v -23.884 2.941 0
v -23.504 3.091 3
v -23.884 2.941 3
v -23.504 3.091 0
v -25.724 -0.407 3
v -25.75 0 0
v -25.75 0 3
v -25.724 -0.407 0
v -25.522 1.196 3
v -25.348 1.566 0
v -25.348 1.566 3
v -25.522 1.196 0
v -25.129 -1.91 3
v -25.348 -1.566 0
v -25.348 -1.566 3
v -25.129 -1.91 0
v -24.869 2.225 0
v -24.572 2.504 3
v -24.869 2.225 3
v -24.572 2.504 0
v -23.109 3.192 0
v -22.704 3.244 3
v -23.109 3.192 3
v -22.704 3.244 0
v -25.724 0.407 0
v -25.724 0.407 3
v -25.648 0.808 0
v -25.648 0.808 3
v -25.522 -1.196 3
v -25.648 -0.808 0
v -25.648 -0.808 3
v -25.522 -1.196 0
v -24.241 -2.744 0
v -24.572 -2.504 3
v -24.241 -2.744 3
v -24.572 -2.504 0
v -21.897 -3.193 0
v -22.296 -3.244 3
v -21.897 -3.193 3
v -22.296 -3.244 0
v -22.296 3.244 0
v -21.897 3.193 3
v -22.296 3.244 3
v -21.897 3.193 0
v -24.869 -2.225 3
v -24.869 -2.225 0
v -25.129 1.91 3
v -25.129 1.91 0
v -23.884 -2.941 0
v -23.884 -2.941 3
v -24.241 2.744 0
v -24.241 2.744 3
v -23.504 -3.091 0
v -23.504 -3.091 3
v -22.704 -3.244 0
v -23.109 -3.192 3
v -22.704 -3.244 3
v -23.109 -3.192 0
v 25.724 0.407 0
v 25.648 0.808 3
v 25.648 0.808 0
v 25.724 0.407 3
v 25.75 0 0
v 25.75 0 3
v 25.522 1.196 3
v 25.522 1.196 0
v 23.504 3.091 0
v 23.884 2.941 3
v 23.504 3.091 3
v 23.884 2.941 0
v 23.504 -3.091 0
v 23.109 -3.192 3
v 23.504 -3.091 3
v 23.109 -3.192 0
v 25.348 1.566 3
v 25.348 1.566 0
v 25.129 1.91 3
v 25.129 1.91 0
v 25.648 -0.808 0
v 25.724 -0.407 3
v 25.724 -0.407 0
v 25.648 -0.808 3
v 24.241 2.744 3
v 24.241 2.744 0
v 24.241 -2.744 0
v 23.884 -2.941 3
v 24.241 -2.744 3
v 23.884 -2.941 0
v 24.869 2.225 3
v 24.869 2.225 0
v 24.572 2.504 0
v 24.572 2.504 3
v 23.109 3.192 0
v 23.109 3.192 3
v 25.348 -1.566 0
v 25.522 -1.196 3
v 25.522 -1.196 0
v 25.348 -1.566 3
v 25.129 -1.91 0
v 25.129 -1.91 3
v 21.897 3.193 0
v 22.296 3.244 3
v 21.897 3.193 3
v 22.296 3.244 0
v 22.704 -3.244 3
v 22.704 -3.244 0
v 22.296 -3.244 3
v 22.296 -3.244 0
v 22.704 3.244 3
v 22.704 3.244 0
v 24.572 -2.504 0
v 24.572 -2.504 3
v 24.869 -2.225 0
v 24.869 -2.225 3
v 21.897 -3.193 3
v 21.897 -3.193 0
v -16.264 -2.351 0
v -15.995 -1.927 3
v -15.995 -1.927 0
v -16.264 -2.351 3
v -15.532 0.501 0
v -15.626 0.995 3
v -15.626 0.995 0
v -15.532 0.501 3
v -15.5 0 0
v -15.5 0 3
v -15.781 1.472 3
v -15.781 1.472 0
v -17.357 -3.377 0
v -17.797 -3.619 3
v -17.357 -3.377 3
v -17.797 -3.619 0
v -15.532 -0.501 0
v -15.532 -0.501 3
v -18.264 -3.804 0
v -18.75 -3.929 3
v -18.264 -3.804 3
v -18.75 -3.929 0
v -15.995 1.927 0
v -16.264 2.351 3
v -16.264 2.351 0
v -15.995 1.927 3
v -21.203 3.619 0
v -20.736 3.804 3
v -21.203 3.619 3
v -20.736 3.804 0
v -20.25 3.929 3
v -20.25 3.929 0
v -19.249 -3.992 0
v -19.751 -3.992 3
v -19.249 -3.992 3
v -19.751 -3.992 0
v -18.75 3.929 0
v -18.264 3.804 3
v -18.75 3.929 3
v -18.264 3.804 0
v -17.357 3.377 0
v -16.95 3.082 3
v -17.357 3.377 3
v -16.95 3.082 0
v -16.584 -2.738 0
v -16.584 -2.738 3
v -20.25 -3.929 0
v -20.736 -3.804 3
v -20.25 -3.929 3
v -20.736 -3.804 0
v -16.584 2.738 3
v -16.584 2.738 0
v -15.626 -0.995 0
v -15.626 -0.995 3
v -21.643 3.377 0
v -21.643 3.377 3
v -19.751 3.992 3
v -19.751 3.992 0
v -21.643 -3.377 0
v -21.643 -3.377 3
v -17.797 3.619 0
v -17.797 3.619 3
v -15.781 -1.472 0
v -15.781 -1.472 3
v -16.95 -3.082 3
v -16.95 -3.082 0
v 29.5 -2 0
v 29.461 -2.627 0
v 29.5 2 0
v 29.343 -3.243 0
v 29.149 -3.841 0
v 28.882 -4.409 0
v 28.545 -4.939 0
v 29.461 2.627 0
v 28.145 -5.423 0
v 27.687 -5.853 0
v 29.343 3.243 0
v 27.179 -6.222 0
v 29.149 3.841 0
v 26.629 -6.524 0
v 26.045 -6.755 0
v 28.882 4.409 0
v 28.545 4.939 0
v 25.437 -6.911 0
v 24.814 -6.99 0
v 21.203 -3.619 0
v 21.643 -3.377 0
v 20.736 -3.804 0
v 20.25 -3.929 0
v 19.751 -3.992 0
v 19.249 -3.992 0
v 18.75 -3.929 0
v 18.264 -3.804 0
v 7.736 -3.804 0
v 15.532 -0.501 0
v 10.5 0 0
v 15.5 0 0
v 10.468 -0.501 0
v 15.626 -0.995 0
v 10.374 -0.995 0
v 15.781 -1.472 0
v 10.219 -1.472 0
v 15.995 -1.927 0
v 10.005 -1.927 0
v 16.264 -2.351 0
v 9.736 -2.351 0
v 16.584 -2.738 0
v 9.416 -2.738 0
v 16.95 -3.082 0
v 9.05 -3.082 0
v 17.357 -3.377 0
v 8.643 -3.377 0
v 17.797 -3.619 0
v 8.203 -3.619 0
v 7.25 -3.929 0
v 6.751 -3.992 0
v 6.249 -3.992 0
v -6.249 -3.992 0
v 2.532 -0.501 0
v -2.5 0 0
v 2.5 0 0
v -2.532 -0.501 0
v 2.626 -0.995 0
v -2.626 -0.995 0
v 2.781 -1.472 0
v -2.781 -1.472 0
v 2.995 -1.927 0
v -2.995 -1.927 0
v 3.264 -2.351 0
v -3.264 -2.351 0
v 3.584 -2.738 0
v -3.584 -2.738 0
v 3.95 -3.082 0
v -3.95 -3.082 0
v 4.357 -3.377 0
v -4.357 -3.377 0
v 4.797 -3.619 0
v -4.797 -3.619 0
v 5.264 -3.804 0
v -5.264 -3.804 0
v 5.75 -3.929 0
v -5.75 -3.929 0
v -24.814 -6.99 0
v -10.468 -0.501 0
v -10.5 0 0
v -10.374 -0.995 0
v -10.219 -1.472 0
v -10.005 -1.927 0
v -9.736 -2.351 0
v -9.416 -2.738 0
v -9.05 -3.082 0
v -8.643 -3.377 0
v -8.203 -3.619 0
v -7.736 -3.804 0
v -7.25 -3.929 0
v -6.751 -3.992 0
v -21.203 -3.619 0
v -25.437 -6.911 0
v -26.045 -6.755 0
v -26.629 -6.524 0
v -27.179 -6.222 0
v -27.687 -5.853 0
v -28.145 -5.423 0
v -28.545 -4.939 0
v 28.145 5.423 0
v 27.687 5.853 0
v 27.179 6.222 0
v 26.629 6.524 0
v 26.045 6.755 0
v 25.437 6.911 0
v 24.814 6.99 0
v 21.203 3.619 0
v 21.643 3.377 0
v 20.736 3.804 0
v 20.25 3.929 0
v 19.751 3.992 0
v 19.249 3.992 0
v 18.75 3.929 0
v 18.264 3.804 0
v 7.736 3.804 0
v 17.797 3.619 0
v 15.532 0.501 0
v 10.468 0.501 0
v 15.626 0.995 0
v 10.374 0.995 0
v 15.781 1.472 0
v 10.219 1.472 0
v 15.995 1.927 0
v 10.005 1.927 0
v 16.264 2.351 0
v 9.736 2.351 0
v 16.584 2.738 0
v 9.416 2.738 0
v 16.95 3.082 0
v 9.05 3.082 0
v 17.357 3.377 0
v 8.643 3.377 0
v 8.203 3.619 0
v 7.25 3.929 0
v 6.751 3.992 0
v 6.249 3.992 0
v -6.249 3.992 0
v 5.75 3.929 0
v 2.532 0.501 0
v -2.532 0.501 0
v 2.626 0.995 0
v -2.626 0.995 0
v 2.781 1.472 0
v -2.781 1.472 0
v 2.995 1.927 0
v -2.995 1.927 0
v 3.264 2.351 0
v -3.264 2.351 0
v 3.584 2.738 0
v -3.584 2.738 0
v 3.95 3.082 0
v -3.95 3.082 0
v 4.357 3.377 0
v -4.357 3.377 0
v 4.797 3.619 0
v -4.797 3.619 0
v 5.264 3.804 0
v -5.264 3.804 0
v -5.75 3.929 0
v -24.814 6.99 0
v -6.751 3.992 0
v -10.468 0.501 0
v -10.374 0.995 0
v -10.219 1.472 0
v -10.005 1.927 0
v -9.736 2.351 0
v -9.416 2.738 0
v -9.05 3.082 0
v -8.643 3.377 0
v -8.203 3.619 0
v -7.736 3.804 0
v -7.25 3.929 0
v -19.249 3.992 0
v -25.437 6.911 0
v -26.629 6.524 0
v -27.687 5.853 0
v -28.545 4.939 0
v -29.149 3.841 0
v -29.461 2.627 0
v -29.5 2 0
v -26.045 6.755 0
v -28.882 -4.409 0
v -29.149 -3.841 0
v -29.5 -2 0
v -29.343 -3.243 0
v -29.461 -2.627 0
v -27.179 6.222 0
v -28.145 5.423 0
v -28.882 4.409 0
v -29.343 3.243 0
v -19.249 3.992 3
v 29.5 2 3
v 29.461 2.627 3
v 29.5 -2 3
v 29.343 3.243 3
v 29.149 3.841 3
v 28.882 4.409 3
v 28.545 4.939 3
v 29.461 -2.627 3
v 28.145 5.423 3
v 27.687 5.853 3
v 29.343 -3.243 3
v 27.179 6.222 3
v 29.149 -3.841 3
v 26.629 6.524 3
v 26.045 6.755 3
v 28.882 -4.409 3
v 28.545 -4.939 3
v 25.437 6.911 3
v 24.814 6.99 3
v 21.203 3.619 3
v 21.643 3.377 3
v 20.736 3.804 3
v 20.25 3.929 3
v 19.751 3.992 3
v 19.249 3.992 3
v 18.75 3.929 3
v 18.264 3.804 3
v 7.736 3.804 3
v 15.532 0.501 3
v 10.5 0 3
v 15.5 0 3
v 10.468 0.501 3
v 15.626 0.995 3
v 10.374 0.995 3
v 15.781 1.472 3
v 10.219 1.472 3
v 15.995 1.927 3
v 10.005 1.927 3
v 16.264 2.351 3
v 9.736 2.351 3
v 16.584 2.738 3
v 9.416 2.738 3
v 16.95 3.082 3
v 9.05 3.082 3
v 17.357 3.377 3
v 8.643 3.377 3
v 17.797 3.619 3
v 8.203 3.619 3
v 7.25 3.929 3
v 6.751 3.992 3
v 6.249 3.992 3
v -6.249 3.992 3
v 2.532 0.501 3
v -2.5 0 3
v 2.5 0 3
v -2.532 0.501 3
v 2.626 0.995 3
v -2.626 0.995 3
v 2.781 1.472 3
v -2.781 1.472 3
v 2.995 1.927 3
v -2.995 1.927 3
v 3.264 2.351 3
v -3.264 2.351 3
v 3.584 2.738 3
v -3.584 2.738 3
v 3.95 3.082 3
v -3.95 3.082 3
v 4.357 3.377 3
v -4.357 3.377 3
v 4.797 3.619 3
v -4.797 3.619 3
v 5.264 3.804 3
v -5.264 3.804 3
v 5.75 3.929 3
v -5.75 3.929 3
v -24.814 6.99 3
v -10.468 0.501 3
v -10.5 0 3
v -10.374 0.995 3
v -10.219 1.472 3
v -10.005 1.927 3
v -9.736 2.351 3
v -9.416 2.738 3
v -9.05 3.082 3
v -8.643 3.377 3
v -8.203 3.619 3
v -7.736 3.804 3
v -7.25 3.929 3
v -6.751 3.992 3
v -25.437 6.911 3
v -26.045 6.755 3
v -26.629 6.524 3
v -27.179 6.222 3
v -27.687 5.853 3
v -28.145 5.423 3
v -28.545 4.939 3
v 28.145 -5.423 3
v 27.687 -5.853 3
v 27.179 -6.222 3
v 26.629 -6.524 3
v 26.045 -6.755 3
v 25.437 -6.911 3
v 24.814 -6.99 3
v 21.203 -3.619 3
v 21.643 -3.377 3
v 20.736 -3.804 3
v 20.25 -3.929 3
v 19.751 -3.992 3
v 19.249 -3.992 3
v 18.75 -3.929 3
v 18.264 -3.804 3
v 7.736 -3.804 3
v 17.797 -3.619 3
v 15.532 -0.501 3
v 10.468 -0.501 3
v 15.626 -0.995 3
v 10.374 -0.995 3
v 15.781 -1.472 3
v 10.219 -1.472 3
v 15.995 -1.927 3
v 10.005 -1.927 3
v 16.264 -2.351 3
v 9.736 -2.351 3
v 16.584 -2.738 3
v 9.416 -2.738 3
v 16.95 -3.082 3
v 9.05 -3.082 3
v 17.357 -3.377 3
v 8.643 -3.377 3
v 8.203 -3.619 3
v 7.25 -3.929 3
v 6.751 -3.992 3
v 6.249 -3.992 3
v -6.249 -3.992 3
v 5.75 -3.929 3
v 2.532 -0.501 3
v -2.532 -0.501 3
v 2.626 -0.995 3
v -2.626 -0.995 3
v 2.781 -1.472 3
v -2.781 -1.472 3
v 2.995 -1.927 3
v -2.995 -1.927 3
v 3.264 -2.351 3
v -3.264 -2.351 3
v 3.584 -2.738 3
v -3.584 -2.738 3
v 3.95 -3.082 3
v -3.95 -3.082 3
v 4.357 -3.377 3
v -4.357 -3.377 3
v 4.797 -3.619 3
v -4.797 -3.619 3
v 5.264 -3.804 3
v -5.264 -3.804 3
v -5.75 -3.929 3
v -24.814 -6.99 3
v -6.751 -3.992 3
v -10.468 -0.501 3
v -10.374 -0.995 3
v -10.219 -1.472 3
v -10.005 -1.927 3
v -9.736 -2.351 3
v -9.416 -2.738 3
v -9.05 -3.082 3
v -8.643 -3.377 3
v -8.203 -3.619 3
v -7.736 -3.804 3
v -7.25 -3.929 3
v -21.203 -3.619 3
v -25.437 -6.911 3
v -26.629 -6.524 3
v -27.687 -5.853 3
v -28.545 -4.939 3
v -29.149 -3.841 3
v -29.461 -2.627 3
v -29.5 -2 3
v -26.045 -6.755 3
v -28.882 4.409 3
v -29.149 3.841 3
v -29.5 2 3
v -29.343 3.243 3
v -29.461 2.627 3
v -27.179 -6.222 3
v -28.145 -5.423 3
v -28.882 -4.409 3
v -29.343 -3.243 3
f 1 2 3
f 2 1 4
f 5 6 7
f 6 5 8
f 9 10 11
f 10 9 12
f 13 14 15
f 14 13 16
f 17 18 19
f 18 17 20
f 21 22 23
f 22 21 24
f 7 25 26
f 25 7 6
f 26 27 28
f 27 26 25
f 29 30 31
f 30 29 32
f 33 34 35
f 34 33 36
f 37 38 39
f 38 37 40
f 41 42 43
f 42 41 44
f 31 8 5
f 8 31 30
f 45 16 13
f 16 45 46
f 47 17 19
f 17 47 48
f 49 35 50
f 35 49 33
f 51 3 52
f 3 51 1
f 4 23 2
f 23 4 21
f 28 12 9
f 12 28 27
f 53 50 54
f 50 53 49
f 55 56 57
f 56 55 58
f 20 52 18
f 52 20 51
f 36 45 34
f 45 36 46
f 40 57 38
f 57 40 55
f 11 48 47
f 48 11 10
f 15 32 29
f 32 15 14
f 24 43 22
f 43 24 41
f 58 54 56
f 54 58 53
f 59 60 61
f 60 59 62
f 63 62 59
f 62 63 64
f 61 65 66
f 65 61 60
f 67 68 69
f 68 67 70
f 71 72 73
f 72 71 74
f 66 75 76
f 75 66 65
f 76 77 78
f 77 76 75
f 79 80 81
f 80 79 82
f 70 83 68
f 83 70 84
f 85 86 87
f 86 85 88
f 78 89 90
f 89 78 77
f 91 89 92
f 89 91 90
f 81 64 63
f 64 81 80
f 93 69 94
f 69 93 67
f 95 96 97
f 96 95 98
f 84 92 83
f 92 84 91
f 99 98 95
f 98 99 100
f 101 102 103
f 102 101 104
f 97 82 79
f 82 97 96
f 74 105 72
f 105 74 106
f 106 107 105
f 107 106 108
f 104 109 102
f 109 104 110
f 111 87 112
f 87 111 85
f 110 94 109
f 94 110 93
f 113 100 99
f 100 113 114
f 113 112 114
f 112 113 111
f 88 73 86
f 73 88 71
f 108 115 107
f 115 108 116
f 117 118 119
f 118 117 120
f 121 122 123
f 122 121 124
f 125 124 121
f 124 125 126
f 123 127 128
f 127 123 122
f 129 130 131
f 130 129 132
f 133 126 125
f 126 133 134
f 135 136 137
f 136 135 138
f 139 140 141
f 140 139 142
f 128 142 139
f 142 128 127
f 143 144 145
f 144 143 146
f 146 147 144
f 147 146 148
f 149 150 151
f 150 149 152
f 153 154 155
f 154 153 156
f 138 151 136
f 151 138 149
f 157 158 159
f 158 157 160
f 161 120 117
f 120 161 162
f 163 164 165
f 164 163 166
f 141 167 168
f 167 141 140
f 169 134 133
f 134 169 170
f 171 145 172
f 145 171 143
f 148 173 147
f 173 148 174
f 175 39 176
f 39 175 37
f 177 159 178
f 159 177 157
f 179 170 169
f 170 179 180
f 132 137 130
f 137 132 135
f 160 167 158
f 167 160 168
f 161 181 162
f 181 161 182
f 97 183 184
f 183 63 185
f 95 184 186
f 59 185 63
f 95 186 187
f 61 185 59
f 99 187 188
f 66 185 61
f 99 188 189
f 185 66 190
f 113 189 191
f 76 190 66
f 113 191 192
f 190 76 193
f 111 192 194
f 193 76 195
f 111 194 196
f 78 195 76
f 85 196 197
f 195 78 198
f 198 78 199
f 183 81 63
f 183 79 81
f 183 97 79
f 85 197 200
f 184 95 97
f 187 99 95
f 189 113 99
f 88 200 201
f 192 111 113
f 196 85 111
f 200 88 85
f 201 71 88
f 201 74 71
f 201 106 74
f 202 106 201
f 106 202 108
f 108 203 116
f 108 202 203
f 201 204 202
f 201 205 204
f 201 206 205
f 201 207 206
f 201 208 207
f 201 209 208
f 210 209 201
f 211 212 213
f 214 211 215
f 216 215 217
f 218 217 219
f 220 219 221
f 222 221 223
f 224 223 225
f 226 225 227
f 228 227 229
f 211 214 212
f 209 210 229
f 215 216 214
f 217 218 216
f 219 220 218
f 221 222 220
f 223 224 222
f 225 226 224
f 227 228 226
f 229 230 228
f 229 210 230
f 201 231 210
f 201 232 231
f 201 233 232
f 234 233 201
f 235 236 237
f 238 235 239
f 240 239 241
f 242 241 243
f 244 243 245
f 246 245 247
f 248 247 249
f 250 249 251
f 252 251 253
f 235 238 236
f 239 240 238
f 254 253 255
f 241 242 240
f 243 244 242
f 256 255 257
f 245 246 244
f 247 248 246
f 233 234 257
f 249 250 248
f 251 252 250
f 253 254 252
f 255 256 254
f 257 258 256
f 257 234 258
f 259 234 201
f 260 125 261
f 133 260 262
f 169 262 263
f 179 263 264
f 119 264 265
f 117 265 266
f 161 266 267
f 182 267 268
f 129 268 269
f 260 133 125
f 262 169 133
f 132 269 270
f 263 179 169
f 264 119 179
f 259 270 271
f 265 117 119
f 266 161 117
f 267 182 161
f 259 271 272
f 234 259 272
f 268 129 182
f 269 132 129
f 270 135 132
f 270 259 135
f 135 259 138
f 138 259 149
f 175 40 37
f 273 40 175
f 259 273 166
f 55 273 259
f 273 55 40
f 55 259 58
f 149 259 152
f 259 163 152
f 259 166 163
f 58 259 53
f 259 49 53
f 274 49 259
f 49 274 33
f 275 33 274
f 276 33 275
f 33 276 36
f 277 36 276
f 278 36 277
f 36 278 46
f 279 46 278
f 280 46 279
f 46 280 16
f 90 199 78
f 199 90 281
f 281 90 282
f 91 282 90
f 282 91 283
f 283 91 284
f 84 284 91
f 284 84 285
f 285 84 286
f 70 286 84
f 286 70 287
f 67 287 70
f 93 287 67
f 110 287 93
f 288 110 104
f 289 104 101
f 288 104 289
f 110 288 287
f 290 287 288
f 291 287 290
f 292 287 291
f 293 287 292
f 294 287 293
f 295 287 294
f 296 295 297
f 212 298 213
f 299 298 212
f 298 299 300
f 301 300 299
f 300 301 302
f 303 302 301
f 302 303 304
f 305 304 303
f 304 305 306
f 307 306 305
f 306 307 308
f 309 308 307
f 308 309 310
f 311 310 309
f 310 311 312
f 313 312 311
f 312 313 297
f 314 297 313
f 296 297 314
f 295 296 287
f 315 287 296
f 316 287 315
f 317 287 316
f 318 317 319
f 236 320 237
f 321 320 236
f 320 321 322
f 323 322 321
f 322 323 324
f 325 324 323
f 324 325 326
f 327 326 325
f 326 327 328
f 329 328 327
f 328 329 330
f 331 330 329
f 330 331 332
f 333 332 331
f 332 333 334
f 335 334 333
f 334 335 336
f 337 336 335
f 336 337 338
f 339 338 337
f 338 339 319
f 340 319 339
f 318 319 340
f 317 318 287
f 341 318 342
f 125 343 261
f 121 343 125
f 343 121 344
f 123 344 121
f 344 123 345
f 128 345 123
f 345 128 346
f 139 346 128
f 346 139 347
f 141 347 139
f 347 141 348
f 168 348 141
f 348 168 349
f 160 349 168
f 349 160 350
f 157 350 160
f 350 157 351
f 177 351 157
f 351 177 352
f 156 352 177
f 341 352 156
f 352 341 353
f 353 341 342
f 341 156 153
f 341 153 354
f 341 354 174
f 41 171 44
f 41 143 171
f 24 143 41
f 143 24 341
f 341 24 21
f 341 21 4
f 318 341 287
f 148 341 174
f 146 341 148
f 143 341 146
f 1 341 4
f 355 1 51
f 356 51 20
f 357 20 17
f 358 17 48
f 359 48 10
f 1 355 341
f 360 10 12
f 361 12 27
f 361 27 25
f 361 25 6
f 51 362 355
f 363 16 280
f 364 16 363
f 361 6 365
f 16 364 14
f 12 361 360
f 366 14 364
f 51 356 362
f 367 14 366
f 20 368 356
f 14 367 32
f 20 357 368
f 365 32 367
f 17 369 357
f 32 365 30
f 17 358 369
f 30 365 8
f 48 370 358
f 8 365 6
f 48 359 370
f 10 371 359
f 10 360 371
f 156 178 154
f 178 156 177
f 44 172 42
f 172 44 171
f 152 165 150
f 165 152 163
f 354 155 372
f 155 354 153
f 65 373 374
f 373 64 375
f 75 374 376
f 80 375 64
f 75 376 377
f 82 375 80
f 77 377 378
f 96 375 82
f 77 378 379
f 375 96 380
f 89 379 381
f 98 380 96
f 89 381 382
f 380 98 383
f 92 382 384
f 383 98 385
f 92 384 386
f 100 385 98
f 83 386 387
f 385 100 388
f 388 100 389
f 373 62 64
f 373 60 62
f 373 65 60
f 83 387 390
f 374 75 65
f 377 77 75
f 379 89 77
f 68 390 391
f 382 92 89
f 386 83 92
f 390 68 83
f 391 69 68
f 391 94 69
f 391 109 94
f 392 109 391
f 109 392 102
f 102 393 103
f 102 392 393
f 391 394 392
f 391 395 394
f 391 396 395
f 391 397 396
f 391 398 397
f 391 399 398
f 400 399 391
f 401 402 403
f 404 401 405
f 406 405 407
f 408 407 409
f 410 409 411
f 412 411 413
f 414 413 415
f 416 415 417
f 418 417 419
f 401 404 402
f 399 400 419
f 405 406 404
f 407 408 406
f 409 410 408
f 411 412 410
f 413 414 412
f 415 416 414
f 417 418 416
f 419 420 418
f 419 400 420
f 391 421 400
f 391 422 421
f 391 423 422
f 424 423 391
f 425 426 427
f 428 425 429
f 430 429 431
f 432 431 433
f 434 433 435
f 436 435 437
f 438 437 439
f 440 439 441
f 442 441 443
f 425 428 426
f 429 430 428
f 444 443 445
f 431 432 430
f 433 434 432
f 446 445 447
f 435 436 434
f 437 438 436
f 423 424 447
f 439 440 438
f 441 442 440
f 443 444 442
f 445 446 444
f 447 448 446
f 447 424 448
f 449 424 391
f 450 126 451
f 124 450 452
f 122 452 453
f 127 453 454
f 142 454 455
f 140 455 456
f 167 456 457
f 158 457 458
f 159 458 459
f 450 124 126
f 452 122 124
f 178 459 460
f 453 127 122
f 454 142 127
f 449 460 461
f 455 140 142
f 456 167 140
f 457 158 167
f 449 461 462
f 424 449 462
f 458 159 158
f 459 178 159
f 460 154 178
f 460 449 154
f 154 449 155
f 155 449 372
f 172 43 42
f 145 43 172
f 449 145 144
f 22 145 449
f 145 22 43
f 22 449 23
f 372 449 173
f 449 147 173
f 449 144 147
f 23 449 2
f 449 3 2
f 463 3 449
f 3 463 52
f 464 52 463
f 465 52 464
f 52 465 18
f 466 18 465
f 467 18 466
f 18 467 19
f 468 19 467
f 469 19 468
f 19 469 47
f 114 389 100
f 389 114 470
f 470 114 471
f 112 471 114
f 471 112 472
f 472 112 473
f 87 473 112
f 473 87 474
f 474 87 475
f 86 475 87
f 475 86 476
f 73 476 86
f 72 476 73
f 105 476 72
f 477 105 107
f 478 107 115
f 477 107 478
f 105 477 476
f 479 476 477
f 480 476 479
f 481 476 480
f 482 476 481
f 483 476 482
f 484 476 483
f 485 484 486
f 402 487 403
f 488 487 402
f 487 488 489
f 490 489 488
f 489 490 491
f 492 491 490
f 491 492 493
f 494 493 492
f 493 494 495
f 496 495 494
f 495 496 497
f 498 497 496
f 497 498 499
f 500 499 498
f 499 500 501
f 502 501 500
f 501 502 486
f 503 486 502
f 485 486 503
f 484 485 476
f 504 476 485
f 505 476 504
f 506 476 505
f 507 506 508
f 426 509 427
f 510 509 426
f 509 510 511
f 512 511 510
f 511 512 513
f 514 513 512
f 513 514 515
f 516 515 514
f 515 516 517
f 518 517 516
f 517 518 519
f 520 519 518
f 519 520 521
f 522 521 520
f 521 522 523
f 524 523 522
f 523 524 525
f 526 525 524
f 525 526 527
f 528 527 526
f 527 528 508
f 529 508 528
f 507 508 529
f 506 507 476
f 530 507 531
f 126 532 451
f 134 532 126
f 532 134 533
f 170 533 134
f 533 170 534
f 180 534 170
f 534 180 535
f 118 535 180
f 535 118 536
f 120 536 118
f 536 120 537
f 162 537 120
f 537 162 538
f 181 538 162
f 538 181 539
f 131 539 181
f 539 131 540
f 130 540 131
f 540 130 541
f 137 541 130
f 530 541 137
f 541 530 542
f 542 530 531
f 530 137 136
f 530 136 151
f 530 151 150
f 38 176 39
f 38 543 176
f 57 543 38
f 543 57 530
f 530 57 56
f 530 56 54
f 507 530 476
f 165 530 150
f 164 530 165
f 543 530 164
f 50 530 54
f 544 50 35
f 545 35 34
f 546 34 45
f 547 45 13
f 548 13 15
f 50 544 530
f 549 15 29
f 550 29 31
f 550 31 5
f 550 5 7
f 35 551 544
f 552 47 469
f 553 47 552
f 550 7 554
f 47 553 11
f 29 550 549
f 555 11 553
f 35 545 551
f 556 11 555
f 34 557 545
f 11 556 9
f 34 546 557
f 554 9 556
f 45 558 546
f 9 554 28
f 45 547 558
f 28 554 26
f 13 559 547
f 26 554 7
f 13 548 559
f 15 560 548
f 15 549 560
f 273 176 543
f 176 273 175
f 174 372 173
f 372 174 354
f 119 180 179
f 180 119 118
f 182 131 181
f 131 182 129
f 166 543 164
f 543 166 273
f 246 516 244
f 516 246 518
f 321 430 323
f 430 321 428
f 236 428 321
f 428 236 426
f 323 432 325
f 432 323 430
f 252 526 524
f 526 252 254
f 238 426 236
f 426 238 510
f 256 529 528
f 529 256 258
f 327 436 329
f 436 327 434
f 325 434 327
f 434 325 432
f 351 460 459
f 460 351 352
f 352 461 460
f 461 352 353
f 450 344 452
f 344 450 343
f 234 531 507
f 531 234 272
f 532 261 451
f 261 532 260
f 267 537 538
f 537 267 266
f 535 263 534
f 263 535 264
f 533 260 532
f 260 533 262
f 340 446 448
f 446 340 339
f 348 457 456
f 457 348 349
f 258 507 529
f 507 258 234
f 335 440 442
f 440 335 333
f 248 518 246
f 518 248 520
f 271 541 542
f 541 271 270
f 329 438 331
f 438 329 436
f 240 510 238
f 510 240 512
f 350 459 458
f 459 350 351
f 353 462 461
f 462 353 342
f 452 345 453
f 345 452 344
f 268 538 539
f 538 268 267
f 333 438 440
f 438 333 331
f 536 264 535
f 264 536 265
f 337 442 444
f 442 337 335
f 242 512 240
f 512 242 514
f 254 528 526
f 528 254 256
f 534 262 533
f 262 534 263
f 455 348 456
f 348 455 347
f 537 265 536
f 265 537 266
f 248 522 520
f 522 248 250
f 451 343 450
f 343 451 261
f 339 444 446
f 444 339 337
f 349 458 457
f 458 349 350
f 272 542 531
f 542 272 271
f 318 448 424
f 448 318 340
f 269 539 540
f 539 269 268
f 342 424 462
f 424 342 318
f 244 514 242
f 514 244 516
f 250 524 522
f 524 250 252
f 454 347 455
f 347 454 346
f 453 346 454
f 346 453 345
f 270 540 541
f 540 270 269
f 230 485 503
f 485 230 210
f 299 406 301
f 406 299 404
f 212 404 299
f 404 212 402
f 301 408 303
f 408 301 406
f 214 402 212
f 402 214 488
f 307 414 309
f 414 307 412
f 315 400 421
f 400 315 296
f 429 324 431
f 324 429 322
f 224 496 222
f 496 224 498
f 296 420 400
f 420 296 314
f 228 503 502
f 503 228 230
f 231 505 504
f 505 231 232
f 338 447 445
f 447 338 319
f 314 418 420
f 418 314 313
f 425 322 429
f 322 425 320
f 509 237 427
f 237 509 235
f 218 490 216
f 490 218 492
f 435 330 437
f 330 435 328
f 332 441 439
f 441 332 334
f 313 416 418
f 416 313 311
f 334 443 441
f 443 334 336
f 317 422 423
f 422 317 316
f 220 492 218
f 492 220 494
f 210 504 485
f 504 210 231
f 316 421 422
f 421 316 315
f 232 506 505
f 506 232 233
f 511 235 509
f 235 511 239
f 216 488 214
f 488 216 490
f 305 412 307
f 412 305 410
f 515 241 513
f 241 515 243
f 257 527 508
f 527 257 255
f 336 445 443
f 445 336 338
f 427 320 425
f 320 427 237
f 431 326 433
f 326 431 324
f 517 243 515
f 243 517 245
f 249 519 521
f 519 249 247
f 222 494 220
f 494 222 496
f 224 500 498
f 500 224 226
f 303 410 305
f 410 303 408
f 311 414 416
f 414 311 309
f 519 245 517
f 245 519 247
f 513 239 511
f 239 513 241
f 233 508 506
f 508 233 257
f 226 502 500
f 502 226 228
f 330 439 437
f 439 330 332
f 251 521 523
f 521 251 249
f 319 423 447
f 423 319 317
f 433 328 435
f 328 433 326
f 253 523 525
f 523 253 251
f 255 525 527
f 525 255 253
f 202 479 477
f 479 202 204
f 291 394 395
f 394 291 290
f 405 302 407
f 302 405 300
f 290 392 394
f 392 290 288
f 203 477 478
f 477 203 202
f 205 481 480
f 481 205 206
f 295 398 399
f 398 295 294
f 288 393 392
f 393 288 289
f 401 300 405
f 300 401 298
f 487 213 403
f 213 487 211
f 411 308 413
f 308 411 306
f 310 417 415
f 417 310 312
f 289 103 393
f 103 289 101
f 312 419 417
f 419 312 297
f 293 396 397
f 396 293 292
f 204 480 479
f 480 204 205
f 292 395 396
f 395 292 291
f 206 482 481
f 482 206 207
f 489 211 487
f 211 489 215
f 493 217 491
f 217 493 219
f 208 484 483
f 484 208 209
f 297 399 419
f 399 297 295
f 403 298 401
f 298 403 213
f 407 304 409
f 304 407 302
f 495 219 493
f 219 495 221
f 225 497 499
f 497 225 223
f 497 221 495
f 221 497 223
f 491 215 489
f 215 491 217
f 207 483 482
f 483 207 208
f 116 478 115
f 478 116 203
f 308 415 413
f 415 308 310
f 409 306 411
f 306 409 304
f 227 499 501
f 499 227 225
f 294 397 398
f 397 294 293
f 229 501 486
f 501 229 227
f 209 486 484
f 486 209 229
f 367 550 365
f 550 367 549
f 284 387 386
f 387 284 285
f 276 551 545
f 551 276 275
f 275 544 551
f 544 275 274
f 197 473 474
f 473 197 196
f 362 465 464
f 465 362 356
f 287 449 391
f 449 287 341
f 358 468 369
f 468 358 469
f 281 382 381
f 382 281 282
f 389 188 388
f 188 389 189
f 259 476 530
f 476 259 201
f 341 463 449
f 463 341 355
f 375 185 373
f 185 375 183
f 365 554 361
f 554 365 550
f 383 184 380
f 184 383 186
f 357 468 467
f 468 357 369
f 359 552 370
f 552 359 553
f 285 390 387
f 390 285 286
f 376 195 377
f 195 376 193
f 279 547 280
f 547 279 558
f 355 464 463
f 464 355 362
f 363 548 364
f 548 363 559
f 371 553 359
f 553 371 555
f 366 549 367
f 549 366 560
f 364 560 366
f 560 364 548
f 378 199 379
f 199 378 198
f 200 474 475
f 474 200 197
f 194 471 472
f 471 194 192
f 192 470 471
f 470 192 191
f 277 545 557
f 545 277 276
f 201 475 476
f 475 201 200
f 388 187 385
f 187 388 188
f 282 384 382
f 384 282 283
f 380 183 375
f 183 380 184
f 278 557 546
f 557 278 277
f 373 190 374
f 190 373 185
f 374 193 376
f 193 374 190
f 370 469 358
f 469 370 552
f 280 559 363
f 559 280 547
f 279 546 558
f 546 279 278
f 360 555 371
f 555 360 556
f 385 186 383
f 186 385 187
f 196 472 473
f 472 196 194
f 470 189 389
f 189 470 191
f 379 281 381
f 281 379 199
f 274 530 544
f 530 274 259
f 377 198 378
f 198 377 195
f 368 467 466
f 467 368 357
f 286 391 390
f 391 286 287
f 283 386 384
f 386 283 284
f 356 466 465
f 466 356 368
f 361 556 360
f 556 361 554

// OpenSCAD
$fn = 50;


difference() {
	union() {
		hull() {
			translate(v = [-24.5000000000, 2.0000000000, 0]) {
				cylinder(h = 3, r = 5);
			}
			translate(v = [24.5000000000, 2.0000000000, 0]) {
				cylinder(h = 3, r = 5);
			}
			translate(v = [-24.5000000000, -2.0000000000, 0]) {
				cylinder(h = 3, r = 5);
			}
			translate(v = [24.5000000000, -2.0000000000, 0]) {
				cylinder(h = 3, r = 5);
			}
		}
	}
	union() {
		#translate(v = [-22.5000000000, 0.0000000000, -100.0000000000]) {
			cylinder(h = 200, r = 3.2500000000);
		}
		#translate(v = [-22.5000000000, 0.0000000000, -100.0000000000]) {
			cylinder(h = 200, r = 3.2500000000);
		}
		#translate(v = [22.5000000000, 0.0000000000, -100.0000000000]) {
			cylinder(h = 200, r = 3.2500000000);
		}
		#translate(v = [22.5000000000, 0.0000000000, -100.0000000000]) {
			cylinder(h = 200, r = 3.2500000000);
		}
		#translate(v = [-19.5000000000, 0, 0]) {
			cylinder(h = 3, r = 4.0000000000);
		}
		#translate(v = [-6.5000000000, 0, 0]) {
			cylinder(h = 3, r = 4.0000000000);
		}
		#translate(v = [6.5000000000, 0, 0]) {
			cylinder(h = 3, r = 4.0000000000);
		}
		#translate(v = [19.5000000000, 0, 0]) {
			cylinder(h = 3, r = 4.0000000000);
		}
	}
}
